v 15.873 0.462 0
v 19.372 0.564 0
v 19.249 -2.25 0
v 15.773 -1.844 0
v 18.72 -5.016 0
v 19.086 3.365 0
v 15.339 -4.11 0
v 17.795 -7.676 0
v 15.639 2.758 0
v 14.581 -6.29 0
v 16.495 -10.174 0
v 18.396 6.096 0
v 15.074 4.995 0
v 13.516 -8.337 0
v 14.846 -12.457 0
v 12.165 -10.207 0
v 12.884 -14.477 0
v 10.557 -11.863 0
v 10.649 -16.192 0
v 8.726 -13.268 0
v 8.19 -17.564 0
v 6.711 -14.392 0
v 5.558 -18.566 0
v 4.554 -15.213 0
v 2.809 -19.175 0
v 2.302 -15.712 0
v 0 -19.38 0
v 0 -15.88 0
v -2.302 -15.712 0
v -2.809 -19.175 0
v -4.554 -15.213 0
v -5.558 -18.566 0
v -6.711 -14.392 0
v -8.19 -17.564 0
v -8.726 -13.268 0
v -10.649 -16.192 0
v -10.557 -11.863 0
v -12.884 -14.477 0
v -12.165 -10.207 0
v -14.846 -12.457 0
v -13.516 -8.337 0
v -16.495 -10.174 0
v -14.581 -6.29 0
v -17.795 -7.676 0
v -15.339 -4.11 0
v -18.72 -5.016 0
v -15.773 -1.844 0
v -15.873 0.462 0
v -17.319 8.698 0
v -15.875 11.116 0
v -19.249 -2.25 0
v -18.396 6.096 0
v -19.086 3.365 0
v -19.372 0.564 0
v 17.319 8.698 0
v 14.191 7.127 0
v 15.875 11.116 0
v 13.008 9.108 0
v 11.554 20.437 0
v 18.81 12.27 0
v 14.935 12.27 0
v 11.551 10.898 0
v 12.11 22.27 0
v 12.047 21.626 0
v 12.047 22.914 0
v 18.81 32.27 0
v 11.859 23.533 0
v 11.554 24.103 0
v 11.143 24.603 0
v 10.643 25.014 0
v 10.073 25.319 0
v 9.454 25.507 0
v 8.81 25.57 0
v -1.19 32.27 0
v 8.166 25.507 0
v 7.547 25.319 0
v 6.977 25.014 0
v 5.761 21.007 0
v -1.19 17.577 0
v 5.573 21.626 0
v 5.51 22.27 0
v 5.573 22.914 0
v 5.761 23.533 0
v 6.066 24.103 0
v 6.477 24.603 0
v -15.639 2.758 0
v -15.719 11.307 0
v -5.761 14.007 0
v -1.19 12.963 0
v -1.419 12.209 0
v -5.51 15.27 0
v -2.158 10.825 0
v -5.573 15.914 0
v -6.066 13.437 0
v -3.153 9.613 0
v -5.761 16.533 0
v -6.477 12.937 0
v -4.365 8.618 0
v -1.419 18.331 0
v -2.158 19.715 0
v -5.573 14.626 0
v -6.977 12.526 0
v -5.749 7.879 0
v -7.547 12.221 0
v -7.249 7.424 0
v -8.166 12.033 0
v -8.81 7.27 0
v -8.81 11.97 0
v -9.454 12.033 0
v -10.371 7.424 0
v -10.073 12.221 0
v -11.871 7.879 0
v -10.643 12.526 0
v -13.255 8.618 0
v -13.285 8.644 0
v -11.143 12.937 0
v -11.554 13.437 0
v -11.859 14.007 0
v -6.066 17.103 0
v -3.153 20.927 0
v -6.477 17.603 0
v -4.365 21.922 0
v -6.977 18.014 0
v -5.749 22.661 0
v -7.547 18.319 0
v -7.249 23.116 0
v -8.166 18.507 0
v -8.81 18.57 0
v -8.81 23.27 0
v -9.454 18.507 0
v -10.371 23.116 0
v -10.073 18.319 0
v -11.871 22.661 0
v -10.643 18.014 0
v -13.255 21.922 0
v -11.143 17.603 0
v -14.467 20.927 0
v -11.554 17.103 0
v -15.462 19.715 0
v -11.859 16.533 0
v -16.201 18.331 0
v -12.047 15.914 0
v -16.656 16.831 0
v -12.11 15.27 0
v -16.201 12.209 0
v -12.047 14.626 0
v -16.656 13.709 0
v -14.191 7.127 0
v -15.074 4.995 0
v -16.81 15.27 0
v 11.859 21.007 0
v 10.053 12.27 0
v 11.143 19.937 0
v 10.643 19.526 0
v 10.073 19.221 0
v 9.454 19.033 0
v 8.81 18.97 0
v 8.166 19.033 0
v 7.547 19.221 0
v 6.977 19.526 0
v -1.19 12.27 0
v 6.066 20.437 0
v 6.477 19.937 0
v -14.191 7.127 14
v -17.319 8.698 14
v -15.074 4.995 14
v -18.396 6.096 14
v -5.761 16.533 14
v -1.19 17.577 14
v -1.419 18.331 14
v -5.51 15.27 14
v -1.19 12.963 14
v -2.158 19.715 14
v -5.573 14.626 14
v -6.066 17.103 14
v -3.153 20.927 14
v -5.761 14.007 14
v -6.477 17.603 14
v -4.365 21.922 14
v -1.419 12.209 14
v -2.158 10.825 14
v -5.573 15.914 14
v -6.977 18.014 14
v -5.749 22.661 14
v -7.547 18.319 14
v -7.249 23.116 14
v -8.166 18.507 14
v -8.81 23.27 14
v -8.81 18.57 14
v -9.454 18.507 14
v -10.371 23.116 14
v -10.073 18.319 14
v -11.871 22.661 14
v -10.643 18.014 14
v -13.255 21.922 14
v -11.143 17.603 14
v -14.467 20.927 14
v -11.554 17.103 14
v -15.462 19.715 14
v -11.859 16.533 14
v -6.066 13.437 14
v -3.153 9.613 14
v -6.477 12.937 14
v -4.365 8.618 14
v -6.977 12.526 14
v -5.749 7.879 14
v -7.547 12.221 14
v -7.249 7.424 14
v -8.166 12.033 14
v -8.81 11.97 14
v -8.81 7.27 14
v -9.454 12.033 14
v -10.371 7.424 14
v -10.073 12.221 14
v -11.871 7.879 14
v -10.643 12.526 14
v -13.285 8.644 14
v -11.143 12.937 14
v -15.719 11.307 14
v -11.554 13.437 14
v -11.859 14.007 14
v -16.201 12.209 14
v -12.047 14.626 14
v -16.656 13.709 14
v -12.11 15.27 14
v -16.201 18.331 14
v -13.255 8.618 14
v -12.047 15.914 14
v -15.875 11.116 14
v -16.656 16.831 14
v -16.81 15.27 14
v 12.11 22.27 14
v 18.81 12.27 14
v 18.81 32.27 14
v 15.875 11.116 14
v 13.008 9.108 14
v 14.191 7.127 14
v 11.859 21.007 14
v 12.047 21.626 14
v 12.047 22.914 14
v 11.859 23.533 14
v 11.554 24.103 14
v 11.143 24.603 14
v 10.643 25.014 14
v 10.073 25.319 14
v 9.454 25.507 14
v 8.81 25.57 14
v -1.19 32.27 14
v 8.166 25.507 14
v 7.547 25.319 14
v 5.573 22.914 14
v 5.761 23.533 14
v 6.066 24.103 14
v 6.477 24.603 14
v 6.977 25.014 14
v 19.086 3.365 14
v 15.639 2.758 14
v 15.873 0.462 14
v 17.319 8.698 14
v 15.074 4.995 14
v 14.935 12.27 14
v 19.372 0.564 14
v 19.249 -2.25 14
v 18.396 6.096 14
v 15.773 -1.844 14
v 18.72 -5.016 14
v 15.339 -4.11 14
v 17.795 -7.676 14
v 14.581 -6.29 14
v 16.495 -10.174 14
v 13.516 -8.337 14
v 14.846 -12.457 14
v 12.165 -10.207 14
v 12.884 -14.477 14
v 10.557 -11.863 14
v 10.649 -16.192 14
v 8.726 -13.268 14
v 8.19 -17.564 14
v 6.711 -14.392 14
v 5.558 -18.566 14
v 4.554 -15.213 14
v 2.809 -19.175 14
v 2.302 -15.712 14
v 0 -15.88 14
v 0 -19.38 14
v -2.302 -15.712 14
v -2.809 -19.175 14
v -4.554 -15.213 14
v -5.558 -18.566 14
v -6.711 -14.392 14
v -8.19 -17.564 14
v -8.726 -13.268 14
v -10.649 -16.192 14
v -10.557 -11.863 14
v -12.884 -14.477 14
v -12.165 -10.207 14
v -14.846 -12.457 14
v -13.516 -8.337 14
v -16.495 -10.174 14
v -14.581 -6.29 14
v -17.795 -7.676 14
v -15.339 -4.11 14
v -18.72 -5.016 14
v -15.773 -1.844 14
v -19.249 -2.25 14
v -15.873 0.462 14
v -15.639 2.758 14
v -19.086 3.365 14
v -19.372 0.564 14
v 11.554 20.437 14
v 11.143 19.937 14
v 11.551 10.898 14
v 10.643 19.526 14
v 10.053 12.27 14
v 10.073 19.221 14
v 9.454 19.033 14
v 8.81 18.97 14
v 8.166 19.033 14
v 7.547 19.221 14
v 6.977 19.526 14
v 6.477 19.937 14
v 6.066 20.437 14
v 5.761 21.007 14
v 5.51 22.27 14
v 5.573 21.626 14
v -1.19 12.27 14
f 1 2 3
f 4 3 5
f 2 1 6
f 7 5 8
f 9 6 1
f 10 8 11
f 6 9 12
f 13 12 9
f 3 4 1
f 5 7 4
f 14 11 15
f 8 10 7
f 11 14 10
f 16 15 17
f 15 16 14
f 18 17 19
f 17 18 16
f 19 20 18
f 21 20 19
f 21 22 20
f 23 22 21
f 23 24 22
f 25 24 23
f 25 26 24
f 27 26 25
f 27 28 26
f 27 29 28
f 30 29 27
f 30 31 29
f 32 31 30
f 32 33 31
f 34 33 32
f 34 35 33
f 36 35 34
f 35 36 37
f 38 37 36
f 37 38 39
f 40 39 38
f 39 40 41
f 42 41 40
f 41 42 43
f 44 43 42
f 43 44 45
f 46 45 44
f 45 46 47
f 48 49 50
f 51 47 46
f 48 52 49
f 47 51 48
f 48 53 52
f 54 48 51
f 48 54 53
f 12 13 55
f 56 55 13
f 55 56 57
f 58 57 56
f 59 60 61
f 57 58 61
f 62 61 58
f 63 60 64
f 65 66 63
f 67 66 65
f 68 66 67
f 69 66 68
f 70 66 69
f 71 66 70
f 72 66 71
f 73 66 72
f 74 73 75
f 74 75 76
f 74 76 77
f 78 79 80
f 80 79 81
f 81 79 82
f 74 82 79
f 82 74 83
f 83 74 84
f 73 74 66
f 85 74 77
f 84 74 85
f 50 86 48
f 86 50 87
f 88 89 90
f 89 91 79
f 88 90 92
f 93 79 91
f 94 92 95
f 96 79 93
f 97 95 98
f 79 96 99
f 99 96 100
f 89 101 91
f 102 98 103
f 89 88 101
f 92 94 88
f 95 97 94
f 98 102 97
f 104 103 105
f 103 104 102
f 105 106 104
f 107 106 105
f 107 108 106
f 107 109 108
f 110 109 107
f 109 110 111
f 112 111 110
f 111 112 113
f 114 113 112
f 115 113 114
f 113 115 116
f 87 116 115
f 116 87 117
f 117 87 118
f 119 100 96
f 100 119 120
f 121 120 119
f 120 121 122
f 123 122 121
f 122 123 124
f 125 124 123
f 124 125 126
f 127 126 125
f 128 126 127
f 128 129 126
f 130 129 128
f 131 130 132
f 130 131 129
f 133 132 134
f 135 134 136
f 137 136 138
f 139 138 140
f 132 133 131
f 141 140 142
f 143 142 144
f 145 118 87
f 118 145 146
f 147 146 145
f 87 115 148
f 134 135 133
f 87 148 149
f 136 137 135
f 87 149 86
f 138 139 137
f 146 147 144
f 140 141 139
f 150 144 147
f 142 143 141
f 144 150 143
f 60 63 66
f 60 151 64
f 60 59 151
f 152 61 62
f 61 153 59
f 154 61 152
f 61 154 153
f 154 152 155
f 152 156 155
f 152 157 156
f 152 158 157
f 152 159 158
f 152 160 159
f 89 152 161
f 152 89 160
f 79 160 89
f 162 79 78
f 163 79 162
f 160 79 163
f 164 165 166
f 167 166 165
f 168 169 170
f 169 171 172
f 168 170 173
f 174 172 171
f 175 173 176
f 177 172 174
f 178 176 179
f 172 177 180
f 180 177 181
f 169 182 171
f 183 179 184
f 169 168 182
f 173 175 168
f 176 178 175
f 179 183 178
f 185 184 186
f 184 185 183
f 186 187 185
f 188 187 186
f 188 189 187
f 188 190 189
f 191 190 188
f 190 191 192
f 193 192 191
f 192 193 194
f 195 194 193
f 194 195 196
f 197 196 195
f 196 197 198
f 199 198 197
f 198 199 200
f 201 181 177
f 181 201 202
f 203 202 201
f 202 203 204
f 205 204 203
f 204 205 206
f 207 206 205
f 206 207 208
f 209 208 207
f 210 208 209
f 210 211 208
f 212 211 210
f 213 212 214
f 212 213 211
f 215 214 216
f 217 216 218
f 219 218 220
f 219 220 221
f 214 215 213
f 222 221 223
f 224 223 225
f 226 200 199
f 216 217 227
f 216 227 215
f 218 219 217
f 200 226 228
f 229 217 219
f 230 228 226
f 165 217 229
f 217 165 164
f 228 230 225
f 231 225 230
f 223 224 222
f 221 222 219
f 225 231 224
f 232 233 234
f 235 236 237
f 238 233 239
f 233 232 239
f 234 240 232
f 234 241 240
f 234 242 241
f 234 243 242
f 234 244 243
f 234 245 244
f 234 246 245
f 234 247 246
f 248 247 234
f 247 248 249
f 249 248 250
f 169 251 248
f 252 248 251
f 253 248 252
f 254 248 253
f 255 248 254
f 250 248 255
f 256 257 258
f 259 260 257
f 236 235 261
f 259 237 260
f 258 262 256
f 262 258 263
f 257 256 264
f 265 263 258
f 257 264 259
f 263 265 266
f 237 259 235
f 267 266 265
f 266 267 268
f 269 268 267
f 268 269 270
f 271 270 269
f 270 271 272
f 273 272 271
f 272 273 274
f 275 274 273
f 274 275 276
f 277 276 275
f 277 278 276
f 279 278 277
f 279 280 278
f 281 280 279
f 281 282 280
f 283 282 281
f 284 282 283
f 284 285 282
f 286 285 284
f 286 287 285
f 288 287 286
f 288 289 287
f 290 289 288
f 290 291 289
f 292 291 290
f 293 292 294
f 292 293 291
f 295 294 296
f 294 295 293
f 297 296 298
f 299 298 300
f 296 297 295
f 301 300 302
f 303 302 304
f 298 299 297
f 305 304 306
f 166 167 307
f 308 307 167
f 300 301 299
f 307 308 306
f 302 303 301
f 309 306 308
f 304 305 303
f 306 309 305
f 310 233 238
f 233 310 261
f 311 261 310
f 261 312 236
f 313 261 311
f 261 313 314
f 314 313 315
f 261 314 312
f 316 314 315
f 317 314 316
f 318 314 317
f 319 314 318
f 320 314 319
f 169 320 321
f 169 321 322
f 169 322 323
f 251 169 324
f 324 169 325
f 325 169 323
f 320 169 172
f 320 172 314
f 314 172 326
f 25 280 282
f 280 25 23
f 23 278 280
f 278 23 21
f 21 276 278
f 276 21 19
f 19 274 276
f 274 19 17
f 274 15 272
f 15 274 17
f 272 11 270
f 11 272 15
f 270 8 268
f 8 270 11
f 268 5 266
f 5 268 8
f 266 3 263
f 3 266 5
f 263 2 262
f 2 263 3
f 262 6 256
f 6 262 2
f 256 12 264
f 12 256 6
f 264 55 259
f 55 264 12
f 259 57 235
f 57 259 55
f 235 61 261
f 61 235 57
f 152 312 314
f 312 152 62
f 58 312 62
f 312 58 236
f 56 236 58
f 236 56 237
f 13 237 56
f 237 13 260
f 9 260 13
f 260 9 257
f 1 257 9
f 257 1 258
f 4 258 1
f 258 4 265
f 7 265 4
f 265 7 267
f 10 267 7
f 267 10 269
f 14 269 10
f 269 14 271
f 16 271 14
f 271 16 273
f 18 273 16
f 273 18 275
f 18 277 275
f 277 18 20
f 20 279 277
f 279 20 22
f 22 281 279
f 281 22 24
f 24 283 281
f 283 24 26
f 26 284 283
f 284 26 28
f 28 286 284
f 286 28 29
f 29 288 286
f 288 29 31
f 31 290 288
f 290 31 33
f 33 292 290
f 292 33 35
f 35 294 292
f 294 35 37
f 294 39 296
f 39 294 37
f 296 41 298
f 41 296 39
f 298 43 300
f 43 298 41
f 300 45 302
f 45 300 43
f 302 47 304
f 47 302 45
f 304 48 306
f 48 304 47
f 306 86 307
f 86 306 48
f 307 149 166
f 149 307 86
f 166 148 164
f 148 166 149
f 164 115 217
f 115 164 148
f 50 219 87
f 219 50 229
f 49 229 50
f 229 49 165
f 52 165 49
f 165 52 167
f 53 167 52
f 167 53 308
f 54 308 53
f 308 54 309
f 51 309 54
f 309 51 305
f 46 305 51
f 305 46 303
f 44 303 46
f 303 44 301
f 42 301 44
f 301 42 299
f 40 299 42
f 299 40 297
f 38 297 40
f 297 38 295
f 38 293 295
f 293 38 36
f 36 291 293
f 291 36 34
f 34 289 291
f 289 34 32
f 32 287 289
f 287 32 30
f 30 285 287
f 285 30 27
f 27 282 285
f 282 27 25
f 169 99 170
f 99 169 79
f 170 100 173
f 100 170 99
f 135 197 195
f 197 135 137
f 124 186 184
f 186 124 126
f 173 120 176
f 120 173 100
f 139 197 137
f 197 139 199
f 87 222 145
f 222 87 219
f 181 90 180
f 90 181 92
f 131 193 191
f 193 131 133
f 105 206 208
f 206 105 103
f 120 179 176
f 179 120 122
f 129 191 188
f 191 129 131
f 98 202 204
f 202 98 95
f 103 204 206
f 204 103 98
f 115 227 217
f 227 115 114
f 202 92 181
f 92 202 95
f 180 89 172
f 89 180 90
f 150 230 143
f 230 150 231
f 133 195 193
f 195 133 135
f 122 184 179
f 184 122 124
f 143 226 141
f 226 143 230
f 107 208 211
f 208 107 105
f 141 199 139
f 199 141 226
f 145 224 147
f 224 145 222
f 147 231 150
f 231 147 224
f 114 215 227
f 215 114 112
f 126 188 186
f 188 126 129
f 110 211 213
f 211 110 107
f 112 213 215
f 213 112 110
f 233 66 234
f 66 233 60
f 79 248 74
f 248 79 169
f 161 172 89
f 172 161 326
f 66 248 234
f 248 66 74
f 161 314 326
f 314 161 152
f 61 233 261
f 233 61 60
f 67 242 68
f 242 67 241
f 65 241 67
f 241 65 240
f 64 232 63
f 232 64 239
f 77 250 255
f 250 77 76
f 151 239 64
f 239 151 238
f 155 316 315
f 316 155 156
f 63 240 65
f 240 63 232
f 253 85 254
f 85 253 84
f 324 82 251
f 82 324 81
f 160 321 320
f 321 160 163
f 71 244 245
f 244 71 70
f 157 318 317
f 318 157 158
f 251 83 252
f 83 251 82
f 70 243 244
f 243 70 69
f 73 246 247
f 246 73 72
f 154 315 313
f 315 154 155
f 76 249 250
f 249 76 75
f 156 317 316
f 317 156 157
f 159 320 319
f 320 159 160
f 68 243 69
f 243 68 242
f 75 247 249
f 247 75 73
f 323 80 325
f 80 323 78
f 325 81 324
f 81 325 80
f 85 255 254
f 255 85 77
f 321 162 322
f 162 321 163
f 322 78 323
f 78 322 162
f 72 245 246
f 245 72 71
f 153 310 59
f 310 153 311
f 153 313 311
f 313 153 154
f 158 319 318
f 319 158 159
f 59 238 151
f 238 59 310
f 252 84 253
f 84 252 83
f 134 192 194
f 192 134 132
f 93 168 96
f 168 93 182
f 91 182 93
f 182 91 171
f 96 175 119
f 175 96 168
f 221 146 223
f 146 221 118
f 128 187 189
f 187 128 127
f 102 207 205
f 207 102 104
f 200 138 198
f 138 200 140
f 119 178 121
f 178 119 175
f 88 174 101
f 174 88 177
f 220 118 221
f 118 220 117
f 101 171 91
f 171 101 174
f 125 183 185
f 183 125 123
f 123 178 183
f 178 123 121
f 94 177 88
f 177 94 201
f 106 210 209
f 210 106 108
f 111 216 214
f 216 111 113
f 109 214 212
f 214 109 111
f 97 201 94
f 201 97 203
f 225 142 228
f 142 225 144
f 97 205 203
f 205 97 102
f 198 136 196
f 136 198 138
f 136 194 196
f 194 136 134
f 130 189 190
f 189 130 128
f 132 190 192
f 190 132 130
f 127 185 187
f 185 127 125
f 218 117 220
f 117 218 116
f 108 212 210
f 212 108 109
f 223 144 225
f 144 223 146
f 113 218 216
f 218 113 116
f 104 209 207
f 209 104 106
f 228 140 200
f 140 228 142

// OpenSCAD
$fn = 32;

// ----------------------------------------------------------------------
// Pipe clamp: 38.76 mm ring, 3.5 mm wall, 14 mm wide
// ----------------------------------------------------------------------

// --- parameters (mm) ---
outer_r = 19.38;          // clamp outside radius
inner_r = 15.88;          // pipe bore radius
band = 3.5;               // band thickness
clamp_w = 14;             // clamp width
opening = 60;             // opening angle between the ends
lug_w = 20;               // lug width
lug_len = 20;             // lug length
bolt_d = 6.6;             // bolt hole
knuckle_d = 16;           // hinge knuckle diameter
pin_d = 6.6;              // hinge pin hole

clamp_profile = [[-9.69, 16.784], [-12.02, 15.202], [-14.097, 13.299], [-15.875, 11.116], [-17.319, 8.698], [-18.396, 6.096], [-19.086, 3.365], [-19.372, 0.564], [-19.249, -2.25], [-18.72, -5.016], [-17.795, -7.676], [-16.495, -10.174], [-14.846, -12.457], [-12.884, -14.477], [-10.649, -16.192], [-8.19, -17.564], [-5.558, -18.566], [-2.809, -19.175], [0, -19.38], [2.809, -19.175], [5.558, -18.566], [8.19, -17.564], [10.649, -16.192], [12.884, -14.477], [14.846, -12.457], [16.495, -10.174], [17.795, -7.676], [18.72, -5.016], [19.249, -2.25], [19.372, 0.564], [19.086, 3.365], [18.396, 6.096], [17.319, 8.698], [15.875, 11.116], [14.097, 13.299], [12.02, 15.202], [9.69, 16.784], [7.94, 13.752], [9.849, 12.457], [11.551, 10.898], [13.008, 9.108], [14.191, 7.127], [15.074, 4.995], [15.639, 2.758], [15.873, 0.462], [15.773, -1.844], [15.339, -4.11], [14.581, -6.29], [13.516, -8.337], [12.165, -10.207], [10.557, -11.863], [8.726, -13.268], [6.711, -14.392], [4.554, -15.213], [2.302, -15.712], [0, -15.88], [-2.302, -15.712], [-4.554, -15.213], [-6.711, -14.392], [-8.726, -13.268], [-10.557, -11.863], [-12.165, -10.207], [-13.516, -8.337], [-14.581, -6.29], [-15.339, -4.11], [-15.773, -1.844], [-15.873, 0.462], [-15.639, 2.758], [-15.074, 4.995], [-14.191, 7.127], [-13.008, 9.108], [-11.551, 10.898], [-9.849, 12.457], [-7.94, 13.752]];

difference() {
  union() {
    linear_extrude(height = clamp_w) polygon(clamp_profile);
    /* hinge knuckle, sunk 2 mm into the band end */
    translate([-8.81, 15.27, 0]) cylinder(h = clamp_w, d = knuckle_d);
    /* bolt lug on the other end */
    translate([-1.19, 12.27, 0]) cube([lug_w, 20, clamp_w]);
  }
  translate([8.81, 22.27, -2.5]) cylinder(h = clamp_w + 5, d = bolt_d);
  translate([-8.81, 15.27, -2.5]) cylinder(h = clamp_w + 5, d = pin_d);
}
